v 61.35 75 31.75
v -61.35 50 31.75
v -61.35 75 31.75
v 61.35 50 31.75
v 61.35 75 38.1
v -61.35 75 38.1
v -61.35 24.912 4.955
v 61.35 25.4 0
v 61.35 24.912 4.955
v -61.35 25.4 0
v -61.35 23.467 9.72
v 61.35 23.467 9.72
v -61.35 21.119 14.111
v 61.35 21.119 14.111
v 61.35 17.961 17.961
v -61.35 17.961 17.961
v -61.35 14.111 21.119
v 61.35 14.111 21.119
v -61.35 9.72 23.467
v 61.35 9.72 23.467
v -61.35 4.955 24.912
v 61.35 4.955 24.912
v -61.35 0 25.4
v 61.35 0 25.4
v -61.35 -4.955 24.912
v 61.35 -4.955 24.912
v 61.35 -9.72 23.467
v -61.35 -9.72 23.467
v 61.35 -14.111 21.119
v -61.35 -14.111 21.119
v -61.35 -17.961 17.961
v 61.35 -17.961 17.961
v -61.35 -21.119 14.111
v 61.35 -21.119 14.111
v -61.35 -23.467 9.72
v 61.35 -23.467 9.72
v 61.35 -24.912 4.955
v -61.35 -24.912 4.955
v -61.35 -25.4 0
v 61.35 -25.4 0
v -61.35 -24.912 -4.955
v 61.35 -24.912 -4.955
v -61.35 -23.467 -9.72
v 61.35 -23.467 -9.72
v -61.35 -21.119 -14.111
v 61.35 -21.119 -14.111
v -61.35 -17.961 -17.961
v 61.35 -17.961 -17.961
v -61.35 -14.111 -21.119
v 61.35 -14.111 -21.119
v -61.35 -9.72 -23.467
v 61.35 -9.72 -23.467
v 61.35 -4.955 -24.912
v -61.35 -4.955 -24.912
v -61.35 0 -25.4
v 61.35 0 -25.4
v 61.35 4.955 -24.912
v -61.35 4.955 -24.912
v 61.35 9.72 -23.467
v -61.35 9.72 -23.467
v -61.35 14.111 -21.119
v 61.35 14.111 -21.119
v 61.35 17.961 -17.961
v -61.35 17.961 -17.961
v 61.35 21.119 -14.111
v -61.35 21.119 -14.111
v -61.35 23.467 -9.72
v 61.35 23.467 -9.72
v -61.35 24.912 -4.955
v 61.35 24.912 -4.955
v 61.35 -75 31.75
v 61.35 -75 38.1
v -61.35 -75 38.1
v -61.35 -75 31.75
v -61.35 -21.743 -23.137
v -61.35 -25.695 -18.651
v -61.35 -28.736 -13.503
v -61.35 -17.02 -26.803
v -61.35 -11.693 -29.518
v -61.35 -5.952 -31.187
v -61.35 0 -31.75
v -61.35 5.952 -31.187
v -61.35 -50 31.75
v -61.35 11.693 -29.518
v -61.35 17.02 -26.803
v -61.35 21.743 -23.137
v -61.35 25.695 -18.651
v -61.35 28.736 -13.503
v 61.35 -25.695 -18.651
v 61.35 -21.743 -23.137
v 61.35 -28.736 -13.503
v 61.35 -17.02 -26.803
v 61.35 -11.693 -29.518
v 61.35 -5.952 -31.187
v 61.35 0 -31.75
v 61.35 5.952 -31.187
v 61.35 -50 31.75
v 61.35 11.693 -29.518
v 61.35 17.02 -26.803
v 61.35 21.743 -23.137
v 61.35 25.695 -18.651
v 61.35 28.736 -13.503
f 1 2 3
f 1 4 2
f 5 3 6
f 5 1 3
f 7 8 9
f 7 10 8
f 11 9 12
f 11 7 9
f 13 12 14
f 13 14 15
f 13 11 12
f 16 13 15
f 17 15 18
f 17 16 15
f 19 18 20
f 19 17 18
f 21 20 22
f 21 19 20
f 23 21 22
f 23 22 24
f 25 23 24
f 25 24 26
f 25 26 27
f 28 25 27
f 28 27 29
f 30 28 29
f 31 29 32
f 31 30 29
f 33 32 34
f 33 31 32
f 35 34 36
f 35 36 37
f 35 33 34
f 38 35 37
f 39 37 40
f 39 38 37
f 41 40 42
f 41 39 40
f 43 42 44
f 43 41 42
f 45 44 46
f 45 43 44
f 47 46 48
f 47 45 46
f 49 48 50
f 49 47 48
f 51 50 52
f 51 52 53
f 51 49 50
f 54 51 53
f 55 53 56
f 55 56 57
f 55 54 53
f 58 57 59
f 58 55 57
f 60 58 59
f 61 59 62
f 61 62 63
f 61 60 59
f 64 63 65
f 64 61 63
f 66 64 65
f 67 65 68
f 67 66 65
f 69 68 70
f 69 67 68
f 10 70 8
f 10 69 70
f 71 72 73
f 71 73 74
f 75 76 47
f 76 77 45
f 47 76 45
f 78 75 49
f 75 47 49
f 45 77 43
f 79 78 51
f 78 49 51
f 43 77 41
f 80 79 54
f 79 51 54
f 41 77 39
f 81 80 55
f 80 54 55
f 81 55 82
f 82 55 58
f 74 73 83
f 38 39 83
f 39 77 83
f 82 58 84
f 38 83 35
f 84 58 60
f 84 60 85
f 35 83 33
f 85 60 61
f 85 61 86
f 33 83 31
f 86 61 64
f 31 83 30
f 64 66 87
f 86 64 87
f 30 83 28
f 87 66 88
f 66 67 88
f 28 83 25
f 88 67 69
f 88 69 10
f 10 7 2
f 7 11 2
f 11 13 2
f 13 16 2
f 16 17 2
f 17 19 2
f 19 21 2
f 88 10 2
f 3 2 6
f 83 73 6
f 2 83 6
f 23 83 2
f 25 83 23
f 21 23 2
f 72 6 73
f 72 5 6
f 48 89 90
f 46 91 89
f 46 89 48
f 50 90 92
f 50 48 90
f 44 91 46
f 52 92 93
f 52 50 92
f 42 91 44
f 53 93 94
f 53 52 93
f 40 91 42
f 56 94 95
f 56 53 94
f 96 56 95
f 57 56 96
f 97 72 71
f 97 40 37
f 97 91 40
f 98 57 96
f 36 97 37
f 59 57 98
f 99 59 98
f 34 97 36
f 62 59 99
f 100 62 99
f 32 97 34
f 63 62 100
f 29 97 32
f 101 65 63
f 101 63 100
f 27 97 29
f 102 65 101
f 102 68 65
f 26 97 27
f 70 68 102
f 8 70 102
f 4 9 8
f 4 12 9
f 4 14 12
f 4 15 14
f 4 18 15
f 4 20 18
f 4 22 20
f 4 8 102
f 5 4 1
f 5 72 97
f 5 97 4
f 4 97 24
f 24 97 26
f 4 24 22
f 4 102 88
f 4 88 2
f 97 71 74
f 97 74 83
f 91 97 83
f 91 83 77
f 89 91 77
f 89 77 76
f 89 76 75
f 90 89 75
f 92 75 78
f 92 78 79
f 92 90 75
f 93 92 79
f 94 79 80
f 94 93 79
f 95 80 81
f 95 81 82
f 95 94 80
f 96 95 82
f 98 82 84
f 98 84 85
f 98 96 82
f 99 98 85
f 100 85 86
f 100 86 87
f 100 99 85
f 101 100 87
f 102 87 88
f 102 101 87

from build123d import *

# Parameters (mm, degrees)
F0_R     = 25.4
F1_DEPTH = 61.35


with BuildPart() as f1:
    # F0 (on Right) → F1 (new body, symmetric)
    with BuildSketch(Plane.YZ):
        Polygon((75, 38.1), (-75, 38.1), (-75, 31.75), (-50, 31.75), (-1.82e-08, 31.75), (50, 31.75), (75, 31.75), align=None)
        with BuildLine():
            Line((-1.82e-08, 31.75), (-50, 31.75))
            Line((-50, 31.75), (-28.7355912274, -13.5028995706))
            ThreePointArc((-28.7355912274, -13.5028995706), (-26.8027942749, 17.0197743538), (-1.82e-08, 31.75))
        make_face()
        with BuildLine():
            ThreePointArc((31.75, 0), (22.4506402963, 22.4506403091), (-1.82e-08, 31.75))
            ThreePointArc((-1.82e-08, 31.75), (-26.8027942749, 17.0197743538), (-28.7355912274, -13.5028995706))
            ThreePointArc((-28.7355912274, -13.5028995706), (0, -31.75), (28.7355912274, -13.5028995706))
            ThreePointArc((28.7355912274, -13.5028995706), (30.9872354484, -6.9176397178), (31.75, 0))
        make_face()
        Circle(F0_R, mode=Mode.SUBTRACT)
        with BuildLine():
            Line((28.7355912274, -13.5028995706), (50, 31.75))
            Line((50, 31.75), (-1.82e-08, 31.75))
            ThreePointArc((-1.82e-08, 31.75), (22.4506402963, 22.4506403091), (31.75, 0))
            ThreePointArc((31.75, 0), (30.9872354484, -6.9176397178), (28.7355912274, -13.5028995706))
        make_face()
    extrude(amount=F1_DEPTH, both=True)


solid = f1.part
